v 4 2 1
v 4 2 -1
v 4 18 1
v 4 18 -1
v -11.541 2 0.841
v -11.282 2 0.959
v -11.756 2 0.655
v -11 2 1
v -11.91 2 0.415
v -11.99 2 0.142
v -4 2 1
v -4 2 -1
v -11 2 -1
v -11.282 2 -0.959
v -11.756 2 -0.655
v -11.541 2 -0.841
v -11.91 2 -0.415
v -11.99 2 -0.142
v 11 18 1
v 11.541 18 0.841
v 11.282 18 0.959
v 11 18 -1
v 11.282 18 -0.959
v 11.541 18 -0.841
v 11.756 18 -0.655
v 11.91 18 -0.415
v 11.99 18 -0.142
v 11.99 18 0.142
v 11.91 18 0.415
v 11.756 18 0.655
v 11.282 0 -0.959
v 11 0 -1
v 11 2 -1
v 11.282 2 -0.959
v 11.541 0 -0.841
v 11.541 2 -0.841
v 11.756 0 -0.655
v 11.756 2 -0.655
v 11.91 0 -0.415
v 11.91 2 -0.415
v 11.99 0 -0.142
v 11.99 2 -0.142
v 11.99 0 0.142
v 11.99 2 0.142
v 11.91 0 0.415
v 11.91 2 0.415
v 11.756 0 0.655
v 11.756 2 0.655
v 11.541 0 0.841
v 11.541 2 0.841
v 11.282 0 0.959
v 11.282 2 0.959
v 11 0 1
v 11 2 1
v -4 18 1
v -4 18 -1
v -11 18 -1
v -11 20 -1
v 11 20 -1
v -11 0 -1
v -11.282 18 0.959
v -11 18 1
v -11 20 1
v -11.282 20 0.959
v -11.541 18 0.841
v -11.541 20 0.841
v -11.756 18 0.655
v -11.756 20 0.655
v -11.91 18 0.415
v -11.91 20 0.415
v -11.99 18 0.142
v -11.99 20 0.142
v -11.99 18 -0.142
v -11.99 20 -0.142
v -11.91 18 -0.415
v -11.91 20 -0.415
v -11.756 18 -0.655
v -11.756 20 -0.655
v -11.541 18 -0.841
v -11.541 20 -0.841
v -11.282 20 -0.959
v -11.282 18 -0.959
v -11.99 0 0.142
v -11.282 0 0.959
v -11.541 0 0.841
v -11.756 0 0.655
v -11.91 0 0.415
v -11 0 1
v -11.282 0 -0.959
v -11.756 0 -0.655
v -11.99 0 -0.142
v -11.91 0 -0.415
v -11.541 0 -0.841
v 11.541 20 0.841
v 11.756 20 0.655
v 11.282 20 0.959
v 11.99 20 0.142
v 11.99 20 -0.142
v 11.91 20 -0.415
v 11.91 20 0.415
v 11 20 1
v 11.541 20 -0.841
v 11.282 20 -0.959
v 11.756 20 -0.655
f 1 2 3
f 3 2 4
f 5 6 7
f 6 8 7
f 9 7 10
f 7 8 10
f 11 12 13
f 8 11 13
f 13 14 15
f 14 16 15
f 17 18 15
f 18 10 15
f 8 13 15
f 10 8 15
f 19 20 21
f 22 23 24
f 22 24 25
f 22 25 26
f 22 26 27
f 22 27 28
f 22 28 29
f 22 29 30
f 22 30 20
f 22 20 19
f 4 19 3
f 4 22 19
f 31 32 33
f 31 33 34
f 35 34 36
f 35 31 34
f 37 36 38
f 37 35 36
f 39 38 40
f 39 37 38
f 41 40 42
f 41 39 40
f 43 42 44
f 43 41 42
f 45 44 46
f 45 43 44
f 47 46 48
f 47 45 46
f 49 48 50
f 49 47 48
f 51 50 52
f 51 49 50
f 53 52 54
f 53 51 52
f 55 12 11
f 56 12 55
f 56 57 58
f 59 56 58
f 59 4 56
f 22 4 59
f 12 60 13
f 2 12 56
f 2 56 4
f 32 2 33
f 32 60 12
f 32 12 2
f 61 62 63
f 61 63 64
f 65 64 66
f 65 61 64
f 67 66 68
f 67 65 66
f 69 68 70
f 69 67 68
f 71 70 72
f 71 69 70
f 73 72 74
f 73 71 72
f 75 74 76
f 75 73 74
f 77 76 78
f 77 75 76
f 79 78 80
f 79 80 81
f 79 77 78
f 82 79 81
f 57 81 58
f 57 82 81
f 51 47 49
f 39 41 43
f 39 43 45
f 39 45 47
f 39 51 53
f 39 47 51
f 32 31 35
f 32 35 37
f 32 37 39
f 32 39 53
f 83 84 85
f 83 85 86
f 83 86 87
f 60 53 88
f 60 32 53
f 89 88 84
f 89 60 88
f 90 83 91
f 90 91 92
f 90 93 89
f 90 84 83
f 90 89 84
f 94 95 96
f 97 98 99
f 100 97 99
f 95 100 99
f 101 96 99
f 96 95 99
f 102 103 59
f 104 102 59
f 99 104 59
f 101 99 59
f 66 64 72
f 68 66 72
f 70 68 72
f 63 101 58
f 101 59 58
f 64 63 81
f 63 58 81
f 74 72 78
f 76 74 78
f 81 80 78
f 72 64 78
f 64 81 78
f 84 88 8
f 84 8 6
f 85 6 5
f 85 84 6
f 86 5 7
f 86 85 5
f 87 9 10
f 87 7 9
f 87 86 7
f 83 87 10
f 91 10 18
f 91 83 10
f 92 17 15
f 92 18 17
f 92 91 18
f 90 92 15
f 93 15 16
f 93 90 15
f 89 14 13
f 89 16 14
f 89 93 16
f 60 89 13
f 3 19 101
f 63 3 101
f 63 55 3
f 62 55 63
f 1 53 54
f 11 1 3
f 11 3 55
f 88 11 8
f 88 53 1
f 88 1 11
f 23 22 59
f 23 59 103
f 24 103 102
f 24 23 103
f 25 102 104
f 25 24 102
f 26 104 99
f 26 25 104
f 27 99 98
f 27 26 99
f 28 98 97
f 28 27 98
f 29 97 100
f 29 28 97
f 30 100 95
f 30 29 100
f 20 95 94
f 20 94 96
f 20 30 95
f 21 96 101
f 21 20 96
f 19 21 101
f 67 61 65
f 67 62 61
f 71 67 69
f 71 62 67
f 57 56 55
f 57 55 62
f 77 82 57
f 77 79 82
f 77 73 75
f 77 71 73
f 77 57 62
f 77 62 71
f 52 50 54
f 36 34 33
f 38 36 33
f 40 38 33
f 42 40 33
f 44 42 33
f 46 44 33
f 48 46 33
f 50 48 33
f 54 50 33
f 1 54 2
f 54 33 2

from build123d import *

# Parameters (mm, degrees)
EXTRUDE_1_DEPTH     = 20
SKETCH_2_W          = 8
SKETCH_2_H          = 16
CUT_EXTRUDE_1_DEPTH = 12


with BuildPart() as part:
    # 草图1 → 凸台-拉伸1 (new body)
    with BuildSketch(Plane(origin=(0, 0, 0), x_dir=(1, 0, 0), z_dir=(0, 1, 0))):
        with BuildLine():
            Line((-11, 1), (11, 1))
            ThreePointArc((11, 1), (12, 0), (11, -1))
            Line((11, -1), (-11, -1))
            ThreePointArc((-11, -1), (-12, 0), (-11, 1))
        make_face()
    extrude(amount=EXTRUDE_1_DEPTH)

    # 草图2 → 切除-拉伸1 (cut)
    with BuildSketch(Plane(origin=(0, 0, -1), x_dir=(-1, 0, 0), z_dir=(0, 0, -1))):
        with Locations((-8, 10)):
            Rectangle(SKETCH_2_W, SKETCH_2_H)
        with Locations((8, 10)):
            Rectangle(SKETCH_2_W, SKETCH_2_H)
    extrude(amount=-CUT_EXTRUDE_1_DEPTH, mode=Mode.SUBTRACT)


solid = part.part
